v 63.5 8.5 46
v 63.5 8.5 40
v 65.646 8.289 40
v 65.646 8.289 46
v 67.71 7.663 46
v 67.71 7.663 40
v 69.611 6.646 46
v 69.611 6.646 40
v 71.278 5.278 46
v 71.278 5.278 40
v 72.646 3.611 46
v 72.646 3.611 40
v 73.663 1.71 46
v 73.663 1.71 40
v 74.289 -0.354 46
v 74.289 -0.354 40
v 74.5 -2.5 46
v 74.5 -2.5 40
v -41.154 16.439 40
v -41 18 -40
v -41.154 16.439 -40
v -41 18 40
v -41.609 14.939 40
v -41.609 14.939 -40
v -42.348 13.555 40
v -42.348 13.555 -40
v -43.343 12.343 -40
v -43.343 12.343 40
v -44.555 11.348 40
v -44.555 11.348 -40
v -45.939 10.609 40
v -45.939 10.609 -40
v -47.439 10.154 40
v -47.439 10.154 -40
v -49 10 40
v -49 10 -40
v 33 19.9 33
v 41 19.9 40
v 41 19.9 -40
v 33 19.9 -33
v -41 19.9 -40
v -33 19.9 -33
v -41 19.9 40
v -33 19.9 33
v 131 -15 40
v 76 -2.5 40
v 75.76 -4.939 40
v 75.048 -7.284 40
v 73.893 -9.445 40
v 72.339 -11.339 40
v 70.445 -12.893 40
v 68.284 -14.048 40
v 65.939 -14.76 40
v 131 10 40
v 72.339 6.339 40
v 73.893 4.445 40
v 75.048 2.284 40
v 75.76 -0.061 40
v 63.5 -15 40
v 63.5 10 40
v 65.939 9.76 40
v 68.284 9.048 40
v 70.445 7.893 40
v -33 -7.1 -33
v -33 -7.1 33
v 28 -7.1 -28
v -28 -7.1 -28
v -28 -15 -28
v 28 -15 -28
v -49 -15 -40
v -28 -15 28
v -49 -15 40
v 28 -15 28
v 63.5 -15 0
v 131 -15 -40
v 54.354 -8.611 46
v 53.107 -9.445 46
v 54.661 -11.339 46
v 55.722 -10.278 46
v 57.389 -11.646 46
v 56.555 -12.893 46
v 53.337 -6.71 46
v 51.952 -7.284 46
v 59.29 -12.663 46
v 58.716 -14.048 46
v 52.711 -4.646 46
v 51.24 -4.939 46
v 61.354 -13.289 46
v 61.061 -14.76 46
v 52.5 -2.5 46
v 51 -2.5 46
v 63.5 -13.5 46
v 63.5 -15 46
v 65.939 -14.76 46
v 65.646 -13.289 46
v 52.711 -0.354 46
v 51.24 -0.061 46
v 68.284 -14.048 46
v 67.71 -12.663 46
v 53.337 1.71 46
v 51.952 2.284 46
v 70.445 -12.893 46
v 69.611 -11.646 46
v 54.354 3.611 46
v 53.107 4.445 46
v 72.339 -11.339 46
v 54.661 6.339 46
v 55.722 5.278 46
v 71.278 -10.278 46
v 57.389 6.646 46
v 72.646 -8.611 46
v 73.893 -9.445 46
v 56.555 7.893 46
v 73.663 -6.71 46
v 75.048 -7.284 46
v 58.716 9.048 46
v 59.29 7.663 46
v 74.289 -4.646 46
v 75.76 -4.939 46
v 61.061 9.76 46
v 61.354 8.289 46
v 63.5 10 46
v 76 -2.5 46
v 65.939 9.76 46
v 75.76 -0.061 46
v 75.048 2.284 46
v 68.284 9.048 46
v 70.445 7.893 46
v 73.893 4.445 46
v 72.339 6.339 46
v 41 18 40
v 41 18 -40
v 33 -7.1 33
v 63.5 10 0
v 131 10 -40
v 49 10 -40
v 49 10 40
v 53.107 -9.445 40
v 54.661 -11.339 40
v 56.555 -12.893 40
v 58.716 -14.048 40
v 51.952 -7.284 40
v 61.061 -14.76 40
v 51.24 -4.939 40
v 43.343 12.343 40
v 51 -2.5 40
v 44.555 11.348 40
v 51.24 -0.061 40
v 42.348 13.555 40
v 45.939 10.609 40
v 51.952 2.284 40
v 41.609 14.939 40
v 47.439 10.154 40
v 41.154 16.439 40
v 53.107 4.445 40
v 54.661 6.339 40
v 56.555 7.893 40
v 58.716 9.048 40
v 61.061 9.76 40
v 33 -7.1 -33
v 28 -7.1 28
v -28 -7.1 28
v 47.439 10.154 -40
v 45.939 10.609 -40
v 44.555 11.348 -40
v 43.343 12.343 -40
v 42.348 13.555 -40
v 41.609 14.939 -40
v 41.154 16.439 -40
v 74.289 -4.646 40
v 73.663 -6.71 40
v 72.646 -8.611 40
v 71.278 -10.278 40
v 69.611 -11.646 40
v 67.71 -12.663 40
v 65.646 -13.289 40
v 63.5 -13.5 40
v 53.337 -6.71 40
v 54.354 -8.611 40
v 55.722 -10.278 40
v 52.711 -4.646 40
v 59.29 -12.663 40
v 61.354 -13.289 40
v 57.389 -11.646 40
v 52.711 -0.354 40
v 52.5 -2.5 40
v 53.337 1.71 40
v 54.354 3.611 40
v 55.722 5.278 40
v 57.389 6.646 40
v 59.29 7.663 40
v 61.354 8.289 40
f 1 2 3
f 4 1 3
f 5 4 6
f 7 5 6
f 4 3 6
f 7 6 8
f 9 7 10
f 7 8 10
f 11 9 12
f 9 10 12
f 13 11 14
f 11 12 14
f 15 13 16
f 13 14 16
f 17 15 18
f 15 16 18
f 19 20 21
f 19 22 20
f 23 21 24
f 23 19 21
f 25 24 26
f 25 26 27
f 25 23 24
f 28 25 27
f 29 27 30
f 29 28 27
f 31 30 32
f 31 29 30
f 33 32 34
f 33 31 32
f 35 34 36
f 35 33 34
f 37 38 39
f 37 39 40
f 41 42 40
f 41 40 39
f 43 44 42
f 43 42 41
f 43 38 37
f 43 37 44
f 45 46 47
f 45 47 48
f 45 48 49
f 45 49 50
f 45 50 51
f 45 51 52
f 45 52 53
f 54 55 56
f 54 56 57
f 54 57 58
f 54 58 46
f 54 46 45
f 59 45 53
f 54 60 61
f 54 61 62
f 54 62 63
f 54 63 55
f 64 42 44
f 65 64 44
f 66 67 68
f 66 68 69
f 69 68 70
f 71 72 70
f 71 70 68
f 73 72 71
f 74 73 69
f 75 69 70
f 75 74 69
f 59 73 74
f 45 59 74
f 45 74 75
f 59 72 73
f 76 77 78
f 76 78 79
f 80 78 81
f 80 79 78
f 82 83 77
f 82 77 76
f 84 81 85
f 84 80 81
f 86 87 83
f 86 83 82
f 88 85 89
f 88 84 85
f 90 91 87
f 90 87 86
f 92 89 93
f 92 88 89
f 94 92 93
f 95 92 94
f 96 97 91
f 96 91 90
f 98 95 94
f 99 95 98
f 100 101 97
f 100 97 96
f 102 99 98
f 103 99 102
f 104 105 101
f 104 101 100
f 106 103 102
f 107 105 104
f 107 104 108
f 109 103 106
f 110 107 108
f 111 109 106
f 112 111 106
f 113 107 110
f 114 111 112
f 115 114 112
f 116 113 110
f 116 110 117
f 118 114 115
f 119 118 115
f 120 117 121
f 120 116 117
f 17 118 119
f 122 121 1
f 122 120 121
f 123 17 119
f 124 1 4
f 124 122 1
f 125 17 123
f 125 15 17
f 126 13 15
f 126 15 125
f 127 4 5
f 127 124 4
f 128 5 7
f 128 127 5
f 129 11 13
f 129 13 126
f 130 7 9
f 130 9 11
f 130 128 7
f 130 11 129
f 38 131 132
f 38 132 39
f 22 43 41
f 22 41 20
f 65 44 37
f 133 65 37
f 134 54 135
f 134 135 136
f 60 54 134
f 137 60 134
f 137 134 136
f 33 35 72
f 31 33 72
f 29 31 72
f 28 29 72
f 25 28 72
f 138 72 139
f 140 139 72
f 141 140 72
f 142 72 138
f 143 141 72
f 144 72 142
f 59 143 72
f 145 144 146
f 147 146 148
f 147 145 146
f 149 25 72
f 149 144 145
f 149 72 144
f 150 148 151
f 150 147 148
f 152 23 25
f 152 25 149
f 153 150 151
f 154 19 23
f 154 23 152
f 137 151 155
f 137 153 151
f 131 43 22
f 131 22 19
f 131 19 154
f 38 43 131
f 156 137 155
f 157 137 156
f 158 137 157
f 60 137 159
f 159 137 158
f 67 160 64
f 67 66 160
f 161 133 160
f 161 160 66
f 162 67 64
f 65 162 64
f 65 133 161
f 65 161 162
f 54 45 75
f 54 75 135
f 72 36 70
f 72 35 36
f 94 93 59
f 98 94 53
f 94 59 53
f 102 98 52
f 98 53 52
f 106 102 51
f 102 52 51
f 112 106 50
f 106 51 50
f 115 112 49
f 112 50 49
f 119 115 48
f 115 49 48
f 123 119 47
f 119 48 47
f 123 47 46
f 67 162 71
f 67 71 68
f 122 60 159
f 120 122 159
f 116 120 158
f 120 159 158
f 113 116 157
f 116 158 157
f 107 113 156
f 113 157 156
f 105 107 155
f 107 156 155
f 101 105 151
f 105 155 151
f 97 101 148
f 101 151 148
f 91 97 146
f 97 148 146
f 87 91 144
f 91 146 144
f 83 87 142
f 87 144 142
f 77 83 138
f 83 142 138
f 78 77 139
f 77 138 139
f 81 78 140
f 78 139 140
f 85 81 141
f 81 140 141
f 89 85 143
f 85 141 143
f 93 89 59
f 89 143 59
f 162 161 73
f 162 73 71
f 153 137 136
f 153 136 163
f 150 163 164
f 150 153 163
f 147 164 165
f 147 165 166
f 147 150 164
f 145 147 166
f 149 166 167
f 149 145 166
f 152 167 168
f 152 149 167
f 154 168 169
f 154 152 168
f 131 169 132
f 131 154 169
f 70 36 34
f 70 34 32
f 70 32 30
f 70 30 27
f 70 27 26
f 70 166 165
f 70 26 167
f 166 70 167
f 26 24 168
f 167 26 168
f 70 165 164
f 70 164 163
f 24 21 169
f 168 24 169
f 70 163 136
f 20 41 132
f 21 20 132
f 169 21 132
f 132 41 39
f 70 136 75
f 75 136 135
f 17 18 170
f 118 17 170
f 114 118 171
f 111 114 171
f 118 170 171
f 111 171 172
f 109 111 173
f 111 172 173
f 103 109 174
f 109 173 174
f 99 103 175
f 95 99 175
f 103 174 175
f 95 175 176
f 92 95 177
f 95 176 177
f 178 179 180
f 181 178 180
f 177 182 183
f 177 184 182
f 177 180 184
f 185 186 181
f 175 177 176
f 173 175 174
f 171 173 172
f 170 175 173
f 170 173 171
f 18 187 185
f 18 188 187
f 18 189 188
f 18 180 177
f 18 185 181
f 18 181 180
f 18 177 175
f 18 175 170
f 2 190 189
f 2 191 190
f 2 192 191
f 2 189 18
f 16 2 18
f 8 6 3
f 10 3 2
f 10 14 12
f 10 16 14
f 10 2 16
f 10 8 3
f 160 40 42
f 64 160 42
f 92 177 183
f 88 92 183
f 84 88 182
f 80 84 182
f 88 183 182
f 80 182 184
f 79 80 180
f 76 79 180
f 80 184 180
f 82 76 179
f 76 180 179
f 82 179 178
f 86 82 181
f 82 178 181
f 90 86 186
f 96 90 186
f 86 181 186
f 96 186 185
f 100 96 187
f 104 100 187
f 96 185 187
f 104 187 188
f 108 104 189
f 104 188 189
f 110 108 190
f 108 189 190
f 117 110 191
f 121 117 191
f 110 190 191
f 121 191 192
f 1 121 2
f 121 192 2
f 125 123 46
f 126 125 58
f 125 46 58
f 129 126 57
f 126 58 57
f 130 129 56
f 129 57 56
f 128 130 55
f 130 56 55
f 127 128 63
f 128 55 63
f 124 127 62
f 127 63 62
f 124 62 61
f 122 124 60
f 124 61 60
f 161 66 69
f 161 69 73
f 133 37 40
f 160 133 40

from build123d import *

# Parameters (mm, degrees)
F1_DEPTH = 40
F2_DEPTH = 46
F4_DEPTH = 27
F5_DEPTH = 60.6


with BuildPart() as f1:
    # F0 (on Top) → F1 (new body, symmetric)
    with BuildSketch(Plane.XY):
        with BuildLine():
            Line((-49, 0), (0, 0))
            Line((0, 0), (41, 0))
            Line((41, 0), (41, 10))
            Line((41, 10), (42.9, 10))
            Line((42.9, 10), (49, 10))
            ThreePointArc((49, 10), (43.3431457505, 12.3431457505), (41, 18))
            Line((41, 18), (41, 19.9))
            Line((41, 19.9), (0, 19.9))
            Line((0, 19.9), (-41, 19.9))
            Line((-41, 19.9), (-41, 18))
            ThreePointArc((-41, 18), (-43.3431457505, 12.3431457505), (-49, 10))
            Line((-49, 10), (-49, 9.95))
            Line((-49, 9.95), (-49, 0))
        make_face()
        Polygon((41, 0), (0, 0), (-49, 0), (-49, -15), (0, -15), (41, -15), align=None)
        with BuildLine():
            Line((41, 10), (41, 0))
            Line((41, 0), (41, -15))
            Line((41, -15), (63.5, -15))
            ThreePointArc((63.5, -15), (51, -2.5), (63.5, 10))
            Line((63.5, 10), (49, 10))
            Line((49, 10), (42.9, 10))
            Line((42.9, 10), (41, 10))
        make_face()
        with BuildLine():
            ThreePointArc((76, -2.5), (72.3388347648, -11.3388347648), (63.5, -15))
            Line((63.5, -15), (86, -15))
            Line((86, -15), (86, -2.5))
            Line((86, -2.5), (86, 10))
            Line((86, 10), (63.5, 10))
            ThreePointArc((63.5, 10), (72.3388347648, 6.3388347648), (76, -2.5))
        make_face()
        Polygon((86, -2.5), (86, -15), (131, -15), (131, 10), (86, 10), align=None)
        with BuildLine():
            Line((63.5, -2.5), (63.5, -13.5))
            ThreePointArc((63.5, -13.5), (71.2781745931, -10.2781745931), (74.5, -2.5))
            ThreePointArc((74.5, -2.5), (71.2781745931, 5.2781745931), (63.5, 8.5))
            Line((63.5, 8.5), (63.5, -2.5))
        make_face()
        with BuildLine():
            ThreePointArc((63.5, 8.5), (52.5, -2.5), (63.5, -13.5))
            Line((63.5, -13.5), (63.5, -2.5))
            Line((63.5, -2.5), (63.5, 8.5))
        make_face()
        with BuildLine():
            ThreePointArc((63.5, 10), (51, -2.5), (63.5, -15))
            Line((63.5, -15), (63.5, -13.5))
            ThreePointArc((63.5, -13.5), (52.5, -2.5), (63.5, 8.5))
            Line((63.5, 8.5), (63.5, 10))
        make_face()
        with BuildLine():
            Line((63.5, -13.5), (63.5, -15))
            ThreePointArc((63.5, -15), (72.3388347648, -11.3388347648), (76, -2.5))
            ThreePointArc((76, -2.5), (72.3388347648, 6.3388347648), (63.5, 10))
            Line((63.5, 10), (63.5, 8.5))
            ThreePointArc((63.5, 8.5), (71.2781745931, 5.2781745931), (74.5, -2.5))
            ThreePointArc((74.5, -2.5), (71.2781745931, -10.2781745931), (63.5, -13.5))
        make_face()
    extrude(amount=F1_DEPTH, both=True)

    # F0 (on Top) → F2 (join)
    with BuildSketch(Plane.XY):
        with BuildLine():
            ThreePointArc((63.5, 10), (51, -2.5), (63.5, -15))
            Line((63.5, -15), (63.5, -13.5))
            ThreePointArc((63.5, -13.5), (52.5, -2.5), (63.5, 8.5))
            Line((63.5, 8.5), (63.5, 10))
        make_face()
        with BuildLine():
            Line((63.5, -13.5), (63.5, -15))
            ThreePointArc((63.5, -15), (72.3388347648, -11.3388347648), (76, -2.5))
            ThreePointArc((76, -2.5), (72.3388347648, 6.3388347648), (63.5, 10))
            Line((63.5, 10), (63.5, 8.5))
            ThreePointArc((63.5, 8.5), (71.2781745931, 5.2781745931), (74.5, -2.5))
            ThreePointArc((74.5, -2.5), (71.2781745931, -10.2781745931), (63.5, -13.5))
        make_face()
    extrude(amount=F2_DEPTH)

    # F3 (on face) → F4 (cut)
    with BuildSketch(Plane(origin=(0, 19.9, 0), x_dir=(-1, 0, 0), z_dir=(0, 1, 0))):
        Polygon((-33, 0), (-28, 0), (-28, 28), (0, 28), (0, 33), (-33, 33), align=None)
        Polygon((28, 28), (28, 0), (28, -28), (0, -28), (-28, -28), (-28, 0), (-33, 0), (-33, -33), (0, -33), (33, -33), (33, 0), (33, 33), (0, 33), (0, 28), align=None)
    extrude(amount=-F4_DEPTH, mode=Mode.SUBTRACT)

    # F5 (cut): a face of the model
    f5_faces = [f1.faces().sort_by_distance(p)[0] for p in [
        (0, 19.9, 0),
    ]]
    extrude(f5_faces, amount=-F5_DEPTH, mode=Mode.SUBTRACT)


solid = f1.part
